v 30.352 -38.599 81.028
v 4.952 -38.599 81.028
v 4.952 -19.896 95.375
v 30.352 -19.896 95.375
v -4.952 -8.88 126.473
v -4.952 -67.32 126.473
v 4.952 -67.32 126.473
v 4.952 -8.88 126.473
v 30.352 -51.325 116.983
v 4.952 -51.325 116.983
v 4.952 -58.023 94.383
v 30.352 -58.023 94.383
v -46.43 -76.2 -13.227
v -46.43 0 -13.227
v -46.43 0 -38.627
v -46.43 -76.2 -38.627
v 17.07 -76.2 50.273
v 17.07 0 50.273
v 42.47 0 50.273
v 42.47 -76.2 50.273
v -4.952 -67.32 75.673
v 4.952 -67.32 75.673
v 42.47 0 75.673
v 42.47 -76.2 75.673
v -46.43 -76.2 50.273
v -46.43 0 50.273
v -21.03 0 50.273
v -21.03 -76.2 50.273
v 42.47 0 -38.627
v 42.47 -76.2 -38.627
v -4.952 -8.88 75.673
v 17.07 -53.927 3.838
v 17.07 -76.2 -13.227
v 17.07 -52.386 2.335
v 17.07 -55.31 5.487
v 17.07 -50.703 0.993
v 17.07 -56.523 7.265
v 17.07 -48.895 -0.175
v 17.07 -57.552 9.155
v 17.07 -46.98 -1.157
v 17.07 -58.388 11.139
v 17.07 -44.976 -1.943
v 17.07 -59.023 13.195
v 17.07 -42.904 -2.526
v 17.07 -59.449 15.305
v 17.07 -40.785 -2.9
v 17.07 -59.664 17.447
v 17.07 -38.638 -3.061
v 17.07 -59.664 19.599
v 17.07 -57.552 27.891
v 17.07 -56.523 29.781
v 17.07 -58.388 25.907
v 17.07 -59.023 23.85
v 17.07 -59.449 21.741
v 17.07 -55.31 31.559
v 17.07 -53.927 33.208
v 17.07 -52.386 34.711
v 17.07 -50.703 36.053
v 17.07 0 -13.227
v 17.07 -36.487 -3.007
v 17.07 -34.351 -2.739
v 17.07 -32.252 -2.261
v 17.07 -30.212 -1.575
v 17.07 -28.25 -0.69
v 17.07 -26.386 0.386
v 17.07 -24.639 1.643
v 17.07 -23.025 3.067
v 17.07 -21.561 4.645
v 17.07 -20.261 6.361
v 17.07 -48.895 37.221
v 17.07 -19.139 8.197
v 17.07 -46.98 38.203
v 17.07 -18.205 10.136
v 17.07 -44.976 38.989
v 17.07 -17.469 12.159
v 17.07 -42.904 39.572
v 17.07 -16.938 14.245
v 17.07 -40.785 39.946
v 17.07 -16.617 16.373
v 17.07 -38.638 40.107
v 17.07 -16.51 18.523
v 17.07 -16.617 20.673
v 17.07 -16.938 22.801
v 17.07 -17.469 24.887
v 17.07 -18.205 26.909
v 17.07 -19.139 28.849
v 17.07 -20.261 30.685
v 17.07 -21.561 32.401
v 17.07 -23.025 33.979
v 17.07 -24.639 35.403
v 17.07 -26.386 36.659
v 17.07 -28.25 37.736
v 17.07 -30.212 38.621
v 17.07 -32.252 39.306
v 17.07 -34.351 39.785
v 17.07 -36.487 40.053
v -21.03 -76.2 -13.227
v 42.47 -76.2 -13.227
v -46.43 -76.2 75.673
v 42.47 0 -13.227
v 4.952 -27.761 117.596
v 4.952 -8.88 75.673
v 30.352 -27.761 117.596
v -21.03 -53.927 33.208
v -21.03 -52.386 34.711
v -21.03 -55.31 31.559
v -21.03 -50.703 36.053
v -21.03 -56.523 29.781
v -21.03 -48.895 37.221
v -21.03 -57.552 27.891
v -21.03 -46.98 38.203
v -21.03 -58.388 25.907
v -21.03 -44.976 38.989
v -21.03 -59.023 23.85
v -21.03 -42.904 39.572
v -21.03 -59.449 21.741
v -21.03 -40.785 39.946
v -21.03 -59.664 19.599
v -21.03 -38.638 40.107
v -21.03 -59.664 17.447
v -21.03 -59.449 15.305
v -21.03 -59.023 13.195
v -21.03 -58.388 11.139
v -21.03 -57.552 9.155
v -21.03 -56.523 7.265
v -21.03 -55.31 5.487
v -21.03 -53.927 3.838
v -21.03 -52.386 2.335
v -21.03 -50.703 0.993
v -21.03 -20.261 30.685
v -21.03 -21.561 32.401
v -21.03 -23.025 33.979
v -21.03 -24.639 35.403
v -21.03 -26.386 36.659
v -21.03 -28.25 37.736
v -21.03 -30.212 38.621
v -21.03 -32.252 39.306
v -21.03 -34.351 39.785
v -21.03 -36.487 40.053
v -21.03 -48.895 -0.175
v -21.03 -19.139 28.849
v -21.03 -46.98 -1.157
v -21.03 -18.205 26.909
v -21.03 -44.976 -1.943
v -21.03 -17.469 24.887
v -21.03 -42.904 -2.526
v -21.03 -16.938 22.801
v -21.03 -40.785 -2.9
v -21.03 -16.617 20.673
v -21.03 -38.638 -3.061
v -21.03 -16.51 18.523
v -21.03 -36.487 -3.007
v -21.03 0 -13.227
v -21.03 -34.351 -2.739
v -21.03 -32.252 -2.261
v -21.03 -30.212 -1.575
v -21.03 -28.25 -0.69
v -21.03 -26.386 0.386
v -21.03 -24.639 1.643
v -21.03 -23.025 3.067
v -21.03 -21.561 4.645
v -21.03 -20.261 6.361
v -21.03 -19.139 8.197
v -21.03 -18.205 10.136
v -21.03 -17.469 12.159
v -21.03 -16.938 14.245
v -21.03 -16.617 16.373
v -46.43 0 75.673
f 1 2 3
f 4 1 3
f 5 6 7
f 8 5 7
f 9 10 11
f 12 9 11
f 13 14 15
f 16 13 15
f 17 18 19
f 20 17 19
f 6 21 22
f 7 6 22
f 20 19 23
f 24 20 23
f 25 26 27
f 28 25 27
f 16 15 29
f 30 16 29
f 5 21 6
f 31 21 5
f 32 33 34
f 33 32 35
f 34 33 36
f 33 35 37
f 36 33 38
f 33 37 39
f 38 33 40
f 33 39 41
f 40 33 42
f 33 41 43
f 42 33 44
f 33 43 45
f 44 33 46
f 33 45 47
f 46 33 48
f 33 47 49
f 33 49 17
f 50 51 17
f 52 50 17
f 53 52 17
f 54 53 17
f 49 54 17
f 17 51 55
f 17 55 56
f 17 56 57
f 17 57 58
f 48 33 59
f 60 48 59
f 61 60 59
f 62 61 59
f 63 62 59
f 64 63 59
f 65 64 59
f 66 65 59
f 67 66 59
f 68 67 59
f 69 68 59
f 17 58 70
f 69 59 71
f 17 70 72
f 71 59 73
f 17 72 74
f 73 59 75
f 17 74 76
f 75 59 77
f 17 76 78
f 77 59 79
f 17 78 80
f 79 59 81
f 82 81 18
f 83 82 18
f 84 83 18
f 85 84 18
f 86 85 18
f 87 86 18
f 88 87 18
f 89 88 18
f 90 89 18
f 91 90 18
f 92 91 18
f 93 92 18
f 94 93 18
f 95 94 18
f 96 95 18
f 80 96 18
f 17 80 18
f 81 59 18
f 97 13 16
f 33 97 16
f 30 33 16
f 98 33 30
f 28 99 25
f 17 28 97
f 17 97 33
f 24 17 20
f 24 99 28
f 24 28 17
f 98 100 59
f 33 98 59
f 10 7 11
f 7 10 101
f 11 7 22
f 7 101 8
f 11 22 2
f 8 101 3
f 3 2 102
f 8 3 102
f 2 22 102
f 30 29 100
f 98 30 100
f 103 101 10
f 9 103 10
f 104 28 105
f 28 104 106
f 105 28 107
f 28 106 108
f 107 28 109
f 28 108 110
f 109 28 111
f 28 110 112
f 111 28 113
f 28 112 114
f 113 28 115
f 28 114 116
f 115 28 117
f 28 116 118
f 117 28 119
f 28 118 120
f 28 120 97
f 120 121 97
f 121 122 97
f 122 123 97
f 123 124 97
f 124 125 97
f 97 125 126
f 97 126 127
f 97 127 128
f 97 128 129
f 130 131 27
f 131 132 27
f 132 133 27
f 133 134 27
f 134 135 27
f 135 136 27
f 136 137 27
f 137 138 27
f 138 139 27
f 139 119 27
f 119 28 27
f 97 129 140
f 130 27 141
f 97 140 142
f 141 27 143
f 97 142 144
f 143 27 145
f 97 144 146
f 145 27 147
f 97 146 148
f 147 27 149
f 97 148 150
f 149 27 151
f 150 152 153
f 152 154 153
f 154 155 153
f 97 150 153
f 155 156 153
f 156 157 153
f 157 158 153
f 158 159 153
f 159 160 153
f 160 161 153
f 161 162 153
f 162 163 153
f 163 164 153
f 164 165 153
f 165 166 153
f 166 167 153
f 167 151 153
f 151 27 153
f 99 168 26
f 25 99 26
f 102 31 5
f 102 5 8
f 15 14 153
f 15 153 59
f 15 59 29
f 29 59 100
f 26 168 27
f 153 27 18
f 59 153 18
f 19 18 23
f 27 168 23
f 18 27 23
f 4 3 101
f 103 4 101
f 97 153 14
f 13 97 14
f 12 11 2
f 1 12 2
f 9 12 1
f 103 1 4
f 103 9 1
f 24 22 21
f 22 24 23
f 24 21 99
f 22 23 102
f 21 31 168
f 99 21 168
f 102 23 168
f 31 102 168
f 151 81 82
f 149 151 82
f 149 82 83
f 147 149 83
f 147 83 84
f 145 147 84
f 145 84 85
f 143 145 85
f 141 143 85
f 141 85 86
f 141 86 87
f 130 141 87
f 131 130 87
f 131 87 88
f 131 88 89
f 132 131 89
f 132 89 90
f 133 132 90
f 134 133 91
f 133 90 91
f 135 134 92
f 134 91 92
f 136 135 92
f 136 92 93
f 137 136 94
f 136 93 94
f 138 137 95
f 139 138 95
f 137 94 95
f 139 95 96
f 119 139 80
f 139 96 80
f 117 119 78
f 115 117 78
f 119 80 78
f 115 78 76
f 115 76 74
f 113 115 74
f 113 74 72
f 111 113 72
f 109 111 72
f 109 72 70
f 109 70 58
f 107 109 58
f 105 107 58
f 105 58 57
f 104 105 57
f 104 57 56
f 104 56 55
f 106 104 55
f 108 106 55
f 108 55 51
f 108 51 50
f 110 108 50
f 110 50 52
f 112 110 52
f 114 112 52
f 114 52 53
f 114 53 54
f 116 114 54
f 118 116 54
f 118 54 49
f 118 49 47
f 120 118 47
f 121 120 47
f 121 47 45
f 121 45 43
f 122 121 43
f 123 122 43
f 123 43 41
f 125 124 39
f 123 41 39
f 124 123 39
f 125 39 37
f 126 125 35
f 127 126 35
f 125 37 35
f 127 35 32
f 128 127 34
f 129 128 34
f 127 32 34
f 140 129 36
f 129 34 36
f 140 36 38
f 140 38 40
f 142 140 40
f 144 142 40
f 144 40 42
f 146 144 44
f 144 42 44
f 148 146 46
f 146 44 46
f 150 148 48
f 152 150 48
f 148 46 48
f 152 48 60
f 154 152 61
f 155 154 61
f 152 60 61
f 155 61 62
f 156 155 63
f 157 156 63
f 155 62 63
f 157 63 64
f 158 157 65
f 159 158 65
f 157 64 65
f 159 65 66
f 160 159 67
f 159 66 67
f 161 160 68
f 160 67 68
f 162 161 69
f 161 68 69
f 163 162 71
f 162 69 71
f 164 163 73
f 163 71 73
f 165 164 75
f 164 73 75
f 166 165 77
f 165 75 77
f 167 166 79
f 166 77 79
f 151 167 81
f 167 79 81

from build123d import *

# Parameters (mm, degrees)
F1_DEPTH = 76.2
F2_R     = 21.590363
F3_DEPTH = 63.501
F4_W     = 9.904528
F4_H     = 58.43965
F5_DEPTH = 50.8
F7_DEPTH = 25.4


with BuildPart() as f1:
    # F0 (on Front) → F1 (new body)
    with BuildSketch(Plane.XZ):
        Polygon((-46.429671, -13.227126), (-46.429671, -38.627126), (42.470329, -38.627126), (42.470329, -13.227126), (17.070329, -13.227126), (17.070329, 50.272874), (42.470329, 50.272874), (42.470329, 75.672874), (-46.429671, 75.672874), (-46.429671, 50.272874), (-21.029671, 50.272874), (-21.029671, -13.227126), align=None)
    extrude(amount=F1_DEPTH)

    # F2 (on face) → F3 (cut, through all)
    with BuildSketch(Plane.YZ.offset(17.070329)):
        with Locations((-38.1, 18.522874)):
            Circle(F2_R)
    extrude(amount=-F3_DEPTH, mode=Mode.SUBTRACT)

    # F4 (on face) → F5 (join)
    with BuildSketch(Plane.XY.offset(75.672874)):
        with Locations((0, -38.1)):
            Rectangle(F4_W, F4_H)
    extrude(amount=F5_DEPTH)

    # F6 (on face) → F7 (join)
    with BuildSketch(Plane.YZ.offset(4.952264)):
        Polygon((-19.896209, 95.37485), (-27.760912, 117.595732), (-51.324553, 116.982586), (-58.022983, 94.382759), (-38.599198, 81.028443), align=None)
    extrude(amount=F7_DEPTH)


solid = f1.part
